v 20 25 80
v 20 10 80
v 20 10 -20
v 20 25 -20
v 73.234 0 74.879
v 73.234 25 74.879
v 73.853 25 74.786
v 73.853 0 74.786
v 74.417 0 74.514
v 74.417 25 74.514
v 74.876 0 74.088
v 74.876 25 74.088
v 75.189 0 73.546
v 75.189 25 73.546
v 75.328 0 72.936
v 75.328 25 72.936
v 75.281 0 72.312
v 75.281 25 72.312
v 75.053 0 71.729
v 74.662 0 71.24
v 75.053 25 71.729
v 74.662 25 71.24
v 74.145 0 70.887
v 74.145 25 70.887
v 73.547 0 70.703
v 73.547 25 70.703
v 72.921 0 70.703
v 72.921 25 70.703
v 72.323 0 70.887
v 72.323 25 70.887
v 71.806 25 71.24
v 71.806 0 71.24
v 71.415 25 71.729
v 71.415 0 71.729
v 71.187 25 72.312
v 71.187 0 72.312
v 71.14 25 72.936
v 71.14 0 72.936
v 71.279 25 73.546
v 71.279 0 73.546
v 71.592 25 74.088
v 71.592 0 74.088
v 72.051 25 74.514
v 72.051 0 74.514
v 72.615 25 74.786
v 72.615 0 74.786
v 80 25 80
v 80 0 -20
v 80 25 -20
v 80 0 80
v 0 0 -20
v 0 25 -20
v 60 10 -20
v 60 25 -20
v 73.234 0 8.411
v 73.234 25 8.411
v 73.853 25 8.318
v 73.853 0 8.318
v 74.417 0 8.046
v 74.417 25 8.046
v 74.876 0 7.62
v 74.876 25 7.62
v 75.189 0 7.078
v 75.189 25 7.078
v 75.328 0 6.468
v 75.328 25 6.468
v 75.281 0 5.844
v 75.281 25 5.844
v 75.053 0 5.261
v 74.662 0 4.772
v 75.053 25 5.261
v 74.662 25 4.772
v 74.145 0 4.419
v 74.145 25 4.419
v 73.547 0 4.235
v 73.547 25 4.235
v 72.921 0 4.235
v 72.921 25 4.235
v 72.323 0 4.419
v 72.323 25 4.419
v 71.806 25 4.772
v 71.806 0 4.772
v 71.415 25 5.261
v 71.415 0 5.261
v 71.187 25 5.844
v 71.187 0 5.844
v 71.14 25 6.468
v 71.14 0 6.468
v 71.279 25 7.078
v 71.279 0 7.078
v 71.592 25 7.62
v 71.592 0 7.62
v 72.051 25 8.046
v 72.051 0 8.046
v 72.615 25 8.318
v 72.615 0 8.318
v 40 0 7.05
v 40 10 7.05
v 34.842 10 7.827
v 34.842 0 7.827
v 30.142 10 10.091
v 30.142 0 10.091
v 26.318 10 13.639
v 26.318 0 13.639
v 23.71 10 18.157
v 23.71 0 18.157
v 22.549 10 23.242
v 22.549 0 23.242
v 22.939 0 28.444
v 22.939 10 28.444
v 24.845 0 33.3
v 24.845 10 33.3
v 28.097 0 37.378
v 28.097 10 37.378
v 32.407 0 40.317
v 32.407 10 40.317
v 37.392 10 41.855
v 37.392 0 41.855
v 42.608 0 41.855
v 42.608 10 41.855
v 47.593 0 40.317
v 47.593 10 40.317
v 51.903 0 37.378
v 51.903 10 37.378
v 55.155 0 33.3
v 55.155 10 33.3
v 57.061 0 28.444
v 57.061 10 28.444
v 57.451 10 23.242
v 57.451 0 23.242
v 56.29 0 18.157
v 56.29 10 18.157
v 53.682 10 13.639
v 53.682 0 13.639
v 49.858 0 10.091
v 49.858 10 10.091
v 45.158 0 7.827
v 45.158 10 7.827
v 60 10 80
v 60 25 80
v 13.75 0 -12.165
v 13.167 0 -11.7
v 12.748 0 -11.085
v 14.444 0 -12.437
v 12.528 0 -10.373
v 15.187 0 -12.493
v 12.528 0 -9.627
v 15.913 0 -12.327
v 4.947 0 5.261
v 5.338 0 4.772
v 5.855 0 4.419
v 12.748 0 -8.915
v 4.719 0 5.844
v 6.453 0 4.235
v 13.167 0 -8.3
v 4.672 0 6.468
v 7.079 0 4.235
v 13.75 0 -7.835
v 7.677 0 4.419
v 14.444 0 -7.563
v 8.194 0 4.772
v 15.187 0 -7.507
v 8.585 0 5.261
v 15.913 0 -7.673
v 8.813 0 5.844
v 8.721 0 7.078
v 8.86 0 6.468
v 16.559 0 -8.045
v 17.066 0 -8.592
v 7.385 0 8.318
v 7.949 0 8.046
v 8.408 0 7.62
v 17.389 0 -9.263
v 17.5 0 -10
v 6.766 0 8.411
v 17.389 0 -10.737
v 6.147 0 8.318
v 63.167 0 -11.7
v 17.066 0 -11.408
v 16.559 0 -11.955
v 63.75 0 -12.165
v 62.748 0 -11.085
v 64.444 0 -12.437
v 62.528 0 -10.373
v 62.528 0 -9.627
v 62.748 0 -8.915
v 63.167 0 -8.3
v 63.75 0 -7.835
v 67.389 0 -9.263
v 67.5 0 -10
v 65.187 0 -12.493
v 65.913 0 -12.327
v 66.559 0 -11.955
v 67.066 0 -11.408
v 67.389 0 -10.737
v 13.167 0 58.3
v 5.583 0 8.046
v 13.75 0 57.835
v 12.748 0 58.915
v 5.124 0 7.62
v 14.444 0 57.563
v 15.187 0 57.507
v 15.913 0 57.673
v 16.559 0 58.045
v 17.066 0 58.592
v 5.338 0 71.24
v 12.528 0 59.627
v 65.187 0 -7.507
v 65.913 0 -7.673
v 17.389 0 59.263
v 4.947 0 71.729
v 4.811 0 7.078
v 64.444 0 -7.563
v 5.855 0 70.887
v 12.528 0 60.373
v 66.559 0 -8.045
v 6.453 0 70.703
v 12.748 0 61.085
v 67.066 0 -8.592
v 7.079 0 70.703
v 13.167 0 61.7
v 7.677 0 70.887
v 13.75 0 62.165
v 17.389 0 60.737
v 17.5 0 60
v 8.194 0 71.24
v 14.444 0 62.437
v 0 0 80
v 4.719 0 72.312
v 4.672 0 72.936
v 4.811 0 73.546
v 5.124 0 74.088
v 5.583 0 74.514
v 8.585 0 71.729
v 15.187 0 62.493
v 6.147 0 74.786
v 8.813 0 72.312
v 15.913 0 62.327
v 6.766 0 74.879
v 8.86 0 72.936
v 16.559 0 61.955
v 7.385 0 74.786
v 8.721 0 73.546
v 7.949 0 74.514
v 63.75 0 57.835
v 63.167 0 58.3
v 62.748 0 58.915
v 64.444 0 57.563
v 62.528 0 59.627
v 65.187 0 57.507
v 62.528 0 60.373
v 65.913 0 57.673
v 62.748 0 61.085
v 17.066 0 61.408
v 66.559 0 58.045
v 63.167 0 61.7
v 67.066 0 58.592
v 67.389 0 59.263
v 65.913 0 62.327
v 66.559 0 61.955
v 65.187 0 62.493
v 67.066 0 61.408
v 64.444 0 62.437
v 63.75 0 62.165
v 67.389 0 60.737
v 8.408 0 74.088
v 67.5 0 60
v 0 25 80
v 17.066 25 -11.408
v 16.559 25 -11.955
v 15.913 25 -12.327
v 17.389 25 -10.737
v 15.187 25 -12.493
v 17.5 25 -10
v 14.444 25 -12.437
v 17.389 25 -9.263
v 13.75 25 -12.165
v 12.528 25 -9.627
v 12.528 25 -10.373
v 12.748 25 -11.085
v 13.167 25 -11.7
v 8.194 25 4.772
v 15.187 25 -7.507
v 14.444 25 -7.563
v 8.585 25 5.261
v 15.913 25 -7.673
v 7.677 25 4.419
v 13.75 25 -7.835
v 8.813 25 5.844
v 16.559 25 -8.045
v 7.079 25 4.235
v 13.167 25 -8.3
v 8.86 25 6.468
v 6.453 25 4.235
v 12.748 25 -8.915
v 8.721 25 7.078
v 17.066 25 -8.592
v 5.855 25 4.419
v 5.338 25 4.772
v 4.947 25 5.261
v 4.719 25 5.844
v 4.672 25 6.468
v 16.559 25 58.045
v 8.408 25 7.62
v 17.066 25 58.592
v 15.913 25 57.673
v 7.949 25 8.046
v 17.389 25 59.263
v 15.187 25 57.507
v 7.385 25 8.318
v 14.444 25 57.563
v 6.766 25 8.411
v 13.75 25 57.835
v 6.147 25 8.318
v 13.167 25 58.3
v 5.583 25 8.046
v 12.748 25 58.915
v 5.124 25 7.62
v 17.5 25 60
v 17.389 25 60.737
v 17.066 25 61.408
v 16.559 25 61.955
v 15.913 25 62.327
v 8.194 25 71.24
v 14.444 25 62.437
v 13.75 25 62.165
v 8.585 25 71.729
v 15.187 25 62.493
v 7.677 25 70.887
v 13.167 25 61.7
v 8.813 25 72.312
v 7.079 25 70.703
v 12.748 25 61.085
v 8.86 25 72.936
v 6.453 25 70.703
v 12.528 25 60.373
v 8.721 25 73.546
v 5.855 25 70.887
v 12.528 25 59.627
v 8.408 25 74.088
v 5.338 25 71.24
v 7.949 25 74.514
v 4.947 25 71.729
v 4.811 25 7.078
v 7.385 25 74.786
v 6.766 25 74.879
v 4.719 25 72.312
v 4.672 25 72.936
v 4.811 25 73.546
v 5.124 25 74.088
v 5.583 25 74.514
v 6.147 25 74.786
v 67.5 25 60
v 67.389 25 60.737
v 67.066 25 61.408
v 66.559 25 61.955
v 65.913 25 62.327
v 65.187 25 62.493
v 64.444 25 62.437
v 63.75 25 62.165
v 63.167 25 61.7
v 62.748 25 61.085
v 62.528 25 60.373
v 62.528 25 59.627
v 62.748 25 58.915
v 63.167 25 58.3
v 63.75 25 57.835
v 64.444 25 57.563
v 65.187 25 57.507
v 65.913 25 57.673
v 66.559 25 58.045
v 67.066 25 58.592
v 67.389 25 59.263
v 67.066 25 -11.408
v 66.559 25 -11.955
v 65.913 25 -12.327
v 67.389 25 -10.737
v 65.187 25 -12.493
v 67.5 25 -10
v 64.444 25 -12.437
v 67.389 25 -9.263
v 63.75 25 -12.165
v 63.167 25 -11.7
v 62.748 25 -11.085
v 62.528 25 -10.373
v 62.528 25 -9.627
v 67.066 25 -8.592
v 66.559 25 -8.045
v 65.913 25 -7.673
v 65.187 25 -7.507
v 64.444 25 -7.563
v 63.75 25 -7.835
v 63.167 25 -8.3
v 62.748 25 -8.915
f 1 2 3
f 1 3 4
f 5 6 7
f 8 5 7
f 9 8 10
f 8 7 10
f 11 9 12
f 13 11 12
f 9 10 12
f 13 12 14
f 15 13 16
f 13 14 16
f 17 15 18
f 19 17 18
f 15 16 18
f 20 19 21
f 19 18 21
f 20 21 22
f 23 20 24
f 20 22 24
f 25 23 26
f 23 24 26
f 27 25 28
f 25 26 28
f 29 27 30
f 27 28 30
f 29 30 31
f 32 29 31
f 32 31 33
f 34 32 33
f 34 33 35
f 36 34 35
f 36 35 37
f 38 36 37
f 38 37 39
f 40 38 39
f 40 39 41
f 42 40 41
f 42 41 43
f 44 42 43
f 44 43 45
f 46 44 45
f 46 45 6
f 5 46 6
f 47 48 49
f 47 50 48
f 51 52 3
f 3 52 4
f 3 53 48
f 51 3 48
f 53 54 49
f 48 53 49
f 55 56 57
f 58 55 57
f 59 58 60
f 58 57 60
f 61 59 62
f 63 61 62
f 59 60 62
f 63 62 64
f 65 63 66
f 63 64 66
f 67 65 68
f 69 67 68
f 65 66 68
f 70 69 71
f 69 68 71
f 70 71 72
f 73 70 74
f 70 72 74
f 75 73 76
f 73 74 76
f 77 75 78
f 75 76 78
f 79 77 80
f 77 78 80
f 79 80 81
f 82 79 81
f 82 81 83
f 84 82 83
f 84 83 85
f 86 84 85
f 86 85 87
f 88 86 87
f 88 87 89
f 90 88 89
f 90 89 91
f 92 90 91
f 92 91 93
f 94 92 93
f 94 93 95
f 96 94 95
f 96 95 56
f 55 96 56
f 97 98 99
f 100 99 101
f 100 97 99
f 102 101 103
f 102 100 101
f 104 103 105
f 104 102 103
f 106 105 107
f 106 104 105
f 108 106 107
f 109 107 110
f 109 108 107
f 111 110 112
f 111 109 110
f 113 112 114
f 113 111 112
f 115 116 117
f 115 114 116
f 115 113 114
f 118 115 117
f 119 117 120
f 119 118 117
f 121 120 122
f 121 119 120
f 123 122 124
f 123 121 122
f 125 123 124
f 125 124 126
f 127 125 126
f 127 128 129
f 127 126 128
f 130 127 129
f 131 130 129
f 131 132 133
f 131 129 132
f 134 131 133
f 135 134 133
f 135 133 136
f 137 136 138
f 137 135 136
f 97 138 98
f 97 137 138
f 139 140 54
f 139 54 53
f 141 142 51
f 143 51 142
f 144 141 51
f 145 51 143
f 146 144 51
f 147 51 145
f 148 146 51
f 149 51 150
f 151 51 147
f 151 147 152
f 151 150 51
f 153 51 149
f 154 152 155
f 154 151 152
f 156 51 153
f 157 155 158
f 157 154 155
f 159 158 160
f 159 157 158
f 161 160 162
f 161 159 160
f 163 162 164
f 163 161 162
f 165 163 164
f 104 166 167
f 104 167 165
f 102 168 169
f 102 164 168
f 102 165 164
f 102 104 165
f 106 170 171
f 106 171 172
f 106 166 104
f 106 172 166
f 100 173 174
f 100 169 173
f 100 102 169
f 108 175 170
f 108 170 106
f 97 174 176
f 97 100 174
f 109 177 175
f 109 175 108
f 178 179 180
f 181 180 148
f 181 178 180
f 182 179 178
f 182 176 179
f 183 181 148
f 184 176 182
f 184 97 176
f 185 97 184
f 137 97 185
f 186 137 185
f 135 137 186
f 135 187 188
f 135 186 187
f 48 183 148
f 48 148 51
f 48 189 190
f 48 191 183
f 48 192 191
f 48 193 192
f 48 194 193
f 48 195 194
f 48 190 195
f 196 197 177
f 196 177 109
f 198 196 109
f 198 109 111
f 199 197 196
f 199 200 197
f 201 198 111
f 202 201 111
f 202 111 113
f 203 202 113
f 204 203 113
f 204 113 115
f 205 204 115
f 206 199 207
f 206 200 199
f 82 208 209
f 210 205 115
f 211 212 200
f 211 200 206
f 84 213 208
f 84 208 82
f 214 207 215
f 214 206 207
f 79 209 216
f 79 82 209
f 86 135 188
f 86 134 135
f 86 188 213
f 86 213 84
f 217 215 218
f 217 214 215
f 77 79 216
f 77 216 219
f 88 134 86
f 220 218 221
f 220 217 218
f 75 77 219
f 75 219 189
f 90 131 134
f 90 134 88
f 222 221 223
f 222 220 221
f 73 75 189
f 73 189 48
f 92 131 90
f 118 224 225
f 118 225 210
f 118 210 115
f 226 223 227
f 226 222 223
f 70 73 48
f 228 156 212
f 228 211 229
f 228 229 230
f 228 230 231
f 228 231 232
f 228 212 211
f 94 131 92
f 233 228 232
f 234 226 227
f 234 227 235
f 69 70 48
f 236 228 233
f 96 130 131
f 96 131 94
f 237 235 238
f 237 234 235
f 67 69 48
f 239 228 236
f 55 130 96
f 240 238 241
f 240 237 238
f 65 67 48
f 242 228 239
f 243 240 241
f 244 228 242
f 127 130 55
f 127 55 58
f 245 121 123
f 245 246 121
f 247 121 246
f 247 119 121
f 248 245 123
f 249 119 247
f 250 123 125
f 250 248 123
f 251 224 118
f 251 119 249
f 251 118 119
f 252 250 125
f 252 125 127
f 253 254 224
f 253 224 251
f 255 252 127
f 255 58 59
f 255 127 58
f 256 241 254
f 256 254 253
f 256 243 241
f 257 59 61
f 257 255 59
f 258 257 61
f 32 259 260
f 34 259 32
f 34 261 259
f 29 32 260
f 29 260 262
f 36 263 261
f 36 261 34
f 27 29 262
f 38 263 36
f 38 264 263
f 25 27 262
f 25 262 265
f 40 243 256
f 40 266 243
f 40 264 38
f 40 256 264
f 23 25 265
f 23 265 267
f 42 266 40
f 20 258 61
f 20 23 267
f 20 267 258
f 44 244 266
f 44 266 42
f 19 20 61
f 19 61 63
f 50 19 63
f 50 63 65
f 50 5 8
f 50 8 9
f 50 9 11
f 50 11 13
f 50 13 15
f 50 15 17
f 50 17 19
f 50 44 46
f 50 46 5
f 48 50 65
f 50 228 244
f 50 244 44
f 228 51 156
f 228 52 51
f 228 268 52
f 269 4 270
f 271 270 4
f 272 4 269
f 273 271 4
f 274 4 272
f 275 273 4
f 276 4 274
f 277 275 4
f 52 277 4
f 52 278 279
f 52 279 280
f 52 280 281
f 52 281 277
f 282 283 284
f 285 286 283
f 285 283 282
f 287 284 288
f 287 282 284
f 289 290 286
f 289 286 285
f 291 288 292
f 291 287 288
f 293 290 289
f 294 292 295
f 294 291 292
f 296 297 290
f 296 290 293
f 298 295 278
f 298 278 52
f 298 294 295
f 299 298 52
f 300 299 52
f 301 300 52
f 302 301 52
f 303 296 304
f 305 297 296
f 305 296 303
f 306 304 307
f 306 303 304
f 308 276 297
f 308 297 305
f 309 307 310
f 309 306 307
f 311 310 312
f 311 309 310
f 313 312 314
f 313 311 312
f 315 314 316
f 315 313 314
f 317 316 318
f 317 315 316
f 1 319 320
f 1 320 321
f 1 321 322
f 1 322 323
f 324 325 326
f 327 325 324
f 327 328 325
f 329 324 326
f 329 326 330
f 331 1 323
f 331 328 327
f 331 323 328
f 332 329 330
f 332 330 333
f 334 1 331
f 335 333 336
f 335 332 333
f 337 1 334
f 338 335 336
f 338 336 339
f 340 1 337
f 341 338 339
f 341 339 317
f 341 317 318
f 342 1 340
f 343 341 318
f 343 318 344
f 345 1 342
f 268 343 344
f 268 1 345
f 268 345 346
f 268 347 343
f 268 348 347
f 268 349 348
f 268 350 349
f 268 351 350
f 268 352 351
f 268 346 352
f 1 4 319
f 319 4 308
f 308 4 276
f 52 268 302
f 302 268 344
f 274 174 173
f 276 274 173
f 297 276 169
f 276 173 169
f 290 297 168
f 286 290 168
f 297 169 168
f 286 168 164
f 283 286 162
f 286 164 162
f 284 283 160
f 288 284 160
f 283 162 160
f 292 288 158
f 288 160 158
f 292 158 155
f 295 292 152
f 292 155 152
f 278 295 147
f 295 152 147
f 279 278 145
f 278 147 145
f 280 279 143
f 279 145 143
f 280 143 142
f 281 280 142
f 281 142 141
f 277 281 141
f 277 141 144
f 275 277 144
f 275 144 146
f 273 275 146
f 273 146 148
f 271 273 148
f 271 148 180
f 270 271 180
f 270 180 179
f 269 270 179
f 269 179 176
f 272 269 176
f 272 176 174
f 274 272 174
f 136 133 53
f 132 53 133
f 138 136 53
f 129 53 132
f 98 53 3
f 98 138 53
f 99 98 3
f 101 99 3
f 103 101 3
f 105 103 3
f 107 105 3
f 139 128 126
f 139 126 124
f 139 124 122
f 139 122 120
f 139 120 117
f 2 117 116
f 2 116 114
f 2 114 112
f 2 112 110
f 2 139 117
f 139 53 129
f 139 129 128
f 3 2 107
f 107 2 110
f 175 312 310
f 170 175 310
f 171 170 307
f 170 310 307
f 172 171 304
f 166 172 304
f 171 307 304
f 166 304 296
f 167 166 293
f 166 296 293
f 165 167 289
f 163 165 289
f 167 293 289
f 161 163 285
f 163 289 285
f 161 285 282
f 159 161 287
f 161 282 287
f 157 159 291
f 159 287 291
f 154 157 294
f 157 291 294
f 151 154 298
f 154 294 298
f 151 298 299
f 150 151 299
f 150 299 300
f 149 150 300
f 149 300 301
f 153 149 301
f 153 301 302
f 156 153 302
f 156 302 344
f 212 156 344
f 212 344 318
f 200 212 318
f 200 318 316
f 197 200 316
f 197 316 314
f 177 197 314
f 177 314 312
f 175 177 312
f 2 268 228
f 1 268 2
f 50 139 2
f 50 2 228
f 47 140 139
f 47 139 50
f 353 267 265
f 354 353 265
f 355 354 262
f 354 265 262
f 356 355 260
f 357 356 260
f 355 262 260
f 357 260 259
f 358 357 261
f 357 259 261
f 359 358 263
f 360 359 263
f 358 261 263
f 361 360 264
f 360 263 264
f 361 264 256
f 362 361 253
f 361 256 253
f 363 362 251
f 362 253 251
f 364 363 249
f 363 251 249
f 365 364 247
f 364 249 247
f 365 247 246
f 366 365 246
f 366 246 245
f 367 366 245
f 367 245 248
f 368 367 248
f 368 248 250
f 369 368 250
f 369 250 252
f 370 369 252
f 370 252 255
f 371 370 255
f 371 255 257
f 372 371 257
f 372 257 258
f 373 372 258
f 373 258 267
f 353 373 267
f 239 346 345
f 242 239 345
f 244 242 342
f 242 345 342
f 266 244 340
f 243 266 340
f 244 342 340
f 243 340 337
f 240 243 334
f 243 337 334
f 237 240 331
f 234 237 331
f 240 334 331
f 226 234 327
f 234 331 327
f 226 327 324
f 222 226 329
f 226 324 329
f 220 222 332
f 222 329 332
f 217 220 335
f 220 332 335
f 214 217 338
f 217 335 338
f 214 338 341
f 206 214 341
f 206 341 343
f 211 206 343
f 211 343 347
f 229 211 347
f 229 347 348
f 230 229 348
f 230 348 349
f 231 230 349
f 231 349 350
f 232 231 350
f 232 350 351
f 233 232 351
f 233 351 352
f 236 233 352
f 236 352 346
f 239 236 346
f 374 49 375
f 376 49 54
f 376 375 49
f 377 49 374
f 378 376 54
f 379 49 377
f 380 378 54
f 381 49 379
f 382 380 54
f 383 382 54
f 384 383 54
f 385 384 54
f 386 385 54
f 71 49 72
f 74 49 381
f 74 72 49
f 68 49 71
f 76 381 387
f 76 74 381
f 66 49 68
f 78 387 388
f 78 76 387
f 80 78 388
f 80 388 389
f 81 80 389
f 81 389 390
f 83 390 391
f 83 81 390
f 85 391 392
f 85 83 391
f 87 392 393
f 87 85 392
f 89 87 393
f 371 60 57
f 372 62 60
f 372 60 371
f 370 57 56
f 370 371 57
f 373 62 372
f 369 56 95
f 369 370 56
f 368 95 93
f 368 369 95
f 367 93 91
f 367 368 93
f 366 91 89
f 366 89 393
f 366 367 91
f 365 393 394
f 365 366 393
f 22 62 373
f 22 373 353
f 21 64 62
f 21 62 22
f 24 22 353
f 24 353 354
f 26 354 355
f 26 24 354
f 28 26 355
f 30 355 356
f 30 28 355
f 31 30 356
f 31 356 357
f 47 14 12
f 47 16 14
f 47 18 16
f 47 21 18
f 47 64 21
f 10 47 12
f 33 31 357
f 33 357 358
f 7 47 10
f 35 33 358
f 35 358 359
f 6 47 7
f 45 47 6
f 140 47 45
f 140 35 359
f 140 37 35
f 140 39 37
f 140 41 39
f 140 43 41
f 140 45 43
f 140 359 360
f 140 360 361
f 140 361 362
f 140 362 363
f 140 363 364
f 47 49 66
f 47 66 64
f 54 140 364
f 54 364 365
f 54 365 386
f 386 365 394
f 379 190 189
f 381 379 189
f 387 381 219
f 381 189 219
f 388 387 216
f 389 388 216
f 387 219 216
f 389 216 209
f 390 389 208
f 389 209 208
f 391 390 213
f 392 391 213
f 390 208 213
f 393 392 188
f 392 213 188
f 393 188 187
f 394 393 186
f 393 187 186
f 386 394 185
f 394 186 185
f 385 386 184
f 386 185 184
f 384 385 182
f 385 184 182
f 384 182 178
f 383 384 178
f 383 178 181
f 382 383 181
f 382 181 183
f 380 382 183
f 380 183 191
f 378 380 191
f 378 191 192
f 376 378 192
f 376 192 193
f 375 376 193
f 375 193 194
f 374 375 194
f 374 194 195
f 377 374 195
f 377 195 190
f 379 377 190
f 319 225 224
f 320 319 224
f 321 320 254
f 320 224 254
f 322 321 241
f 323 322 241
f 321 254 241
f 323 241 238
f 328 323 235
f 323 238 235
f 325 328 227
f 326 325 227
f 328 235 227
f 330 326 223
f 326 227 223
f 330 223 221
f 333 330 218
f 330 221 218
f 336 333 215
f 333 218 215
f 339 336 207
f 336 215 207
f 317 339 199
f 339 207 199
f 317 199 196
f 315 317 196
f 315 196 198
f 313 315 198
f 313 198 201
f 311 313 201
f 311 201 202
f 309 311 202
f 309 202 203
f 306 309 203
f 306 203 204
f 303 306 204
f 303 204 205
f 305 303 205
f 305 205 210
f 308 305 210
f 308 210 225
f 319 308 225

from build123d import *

# Parameters (mm, degrees)
EXTRUDE_1_DEPTH     = 80
EXTRUDE_4_DEPTH     = 20
HOLE_WIZARD_M5_1_D  = 4.2
HOLE_WIZARD_M6_1_D  = 5
SKETCH_2_R          = 17.5
CUT_EXTRUDE_2_DEPTH = 116.866302263


with BuildPart() as part:
    # 草图1 → 拉伸1 (new body)
    with BuildSketch(Plane.XY):
        Polygon((0, 0), (80, 0), (80, 25), (60, 25), (60, 10), (20, 10), (20, 25), (0, 25), align=None)
    extrude(amount=EXTRUDE_1_DEPTH)

    # 草图7 → 拉伸4 (add)
    with BuildSketch(Plane(origin=(0, 0, 0), x_dir=(-1, 0, 0), z_dir=(0, 0, -1))):
        Polygon((-80, 0), (-80, 25), (-60, 25), (-60, 10), (-20, 10), (-20, 25), (0, 25), (0, 0), align=None)
    extrude(amount=EXTRUDE_4_DEPTH)

    # M5 螺纹孔1 (through all)
    with Locations(Plane(origin=(73.234018716, 0, 72.779084328), x_dir=(0, 0, -1), z_dir=(0, -1, 0))):
        with Locations((0, 0), (0, -66.468037432), (66.468037432, -66.468037432), (66.468037432, 0)):
            Hole(HOLE_WIZARD_M5_1_D / 2)

    # M6 螺纹孔1 (through all)
    with Locations(Plane(origin=(0, 25, 0), x_dir=(-1, 0, 0), z_dir=(0, 1, 0))):
        with Locations((-15, -10), (-15, 60), (-65, -10), (-65, 60)):
            Hole(HOLE_WIZARD_M6_1_D / 2)

    # 草图2 → 拉伸2 (cut, through all)
    with BuildSketch(Plane(origin=(0, 0, 0), x_dir=(1, 0, 0), z_dir=(0, 1, 0))):
        with Locations(Location((40, -24.55, 0), (0, 0, 90))):
            Circle(SKETCH_2_R)
    extrude(amount=CUT_EXTRUDE_2_DEPTH, mode=Mode.SUBTRACT)


solid = part.part
